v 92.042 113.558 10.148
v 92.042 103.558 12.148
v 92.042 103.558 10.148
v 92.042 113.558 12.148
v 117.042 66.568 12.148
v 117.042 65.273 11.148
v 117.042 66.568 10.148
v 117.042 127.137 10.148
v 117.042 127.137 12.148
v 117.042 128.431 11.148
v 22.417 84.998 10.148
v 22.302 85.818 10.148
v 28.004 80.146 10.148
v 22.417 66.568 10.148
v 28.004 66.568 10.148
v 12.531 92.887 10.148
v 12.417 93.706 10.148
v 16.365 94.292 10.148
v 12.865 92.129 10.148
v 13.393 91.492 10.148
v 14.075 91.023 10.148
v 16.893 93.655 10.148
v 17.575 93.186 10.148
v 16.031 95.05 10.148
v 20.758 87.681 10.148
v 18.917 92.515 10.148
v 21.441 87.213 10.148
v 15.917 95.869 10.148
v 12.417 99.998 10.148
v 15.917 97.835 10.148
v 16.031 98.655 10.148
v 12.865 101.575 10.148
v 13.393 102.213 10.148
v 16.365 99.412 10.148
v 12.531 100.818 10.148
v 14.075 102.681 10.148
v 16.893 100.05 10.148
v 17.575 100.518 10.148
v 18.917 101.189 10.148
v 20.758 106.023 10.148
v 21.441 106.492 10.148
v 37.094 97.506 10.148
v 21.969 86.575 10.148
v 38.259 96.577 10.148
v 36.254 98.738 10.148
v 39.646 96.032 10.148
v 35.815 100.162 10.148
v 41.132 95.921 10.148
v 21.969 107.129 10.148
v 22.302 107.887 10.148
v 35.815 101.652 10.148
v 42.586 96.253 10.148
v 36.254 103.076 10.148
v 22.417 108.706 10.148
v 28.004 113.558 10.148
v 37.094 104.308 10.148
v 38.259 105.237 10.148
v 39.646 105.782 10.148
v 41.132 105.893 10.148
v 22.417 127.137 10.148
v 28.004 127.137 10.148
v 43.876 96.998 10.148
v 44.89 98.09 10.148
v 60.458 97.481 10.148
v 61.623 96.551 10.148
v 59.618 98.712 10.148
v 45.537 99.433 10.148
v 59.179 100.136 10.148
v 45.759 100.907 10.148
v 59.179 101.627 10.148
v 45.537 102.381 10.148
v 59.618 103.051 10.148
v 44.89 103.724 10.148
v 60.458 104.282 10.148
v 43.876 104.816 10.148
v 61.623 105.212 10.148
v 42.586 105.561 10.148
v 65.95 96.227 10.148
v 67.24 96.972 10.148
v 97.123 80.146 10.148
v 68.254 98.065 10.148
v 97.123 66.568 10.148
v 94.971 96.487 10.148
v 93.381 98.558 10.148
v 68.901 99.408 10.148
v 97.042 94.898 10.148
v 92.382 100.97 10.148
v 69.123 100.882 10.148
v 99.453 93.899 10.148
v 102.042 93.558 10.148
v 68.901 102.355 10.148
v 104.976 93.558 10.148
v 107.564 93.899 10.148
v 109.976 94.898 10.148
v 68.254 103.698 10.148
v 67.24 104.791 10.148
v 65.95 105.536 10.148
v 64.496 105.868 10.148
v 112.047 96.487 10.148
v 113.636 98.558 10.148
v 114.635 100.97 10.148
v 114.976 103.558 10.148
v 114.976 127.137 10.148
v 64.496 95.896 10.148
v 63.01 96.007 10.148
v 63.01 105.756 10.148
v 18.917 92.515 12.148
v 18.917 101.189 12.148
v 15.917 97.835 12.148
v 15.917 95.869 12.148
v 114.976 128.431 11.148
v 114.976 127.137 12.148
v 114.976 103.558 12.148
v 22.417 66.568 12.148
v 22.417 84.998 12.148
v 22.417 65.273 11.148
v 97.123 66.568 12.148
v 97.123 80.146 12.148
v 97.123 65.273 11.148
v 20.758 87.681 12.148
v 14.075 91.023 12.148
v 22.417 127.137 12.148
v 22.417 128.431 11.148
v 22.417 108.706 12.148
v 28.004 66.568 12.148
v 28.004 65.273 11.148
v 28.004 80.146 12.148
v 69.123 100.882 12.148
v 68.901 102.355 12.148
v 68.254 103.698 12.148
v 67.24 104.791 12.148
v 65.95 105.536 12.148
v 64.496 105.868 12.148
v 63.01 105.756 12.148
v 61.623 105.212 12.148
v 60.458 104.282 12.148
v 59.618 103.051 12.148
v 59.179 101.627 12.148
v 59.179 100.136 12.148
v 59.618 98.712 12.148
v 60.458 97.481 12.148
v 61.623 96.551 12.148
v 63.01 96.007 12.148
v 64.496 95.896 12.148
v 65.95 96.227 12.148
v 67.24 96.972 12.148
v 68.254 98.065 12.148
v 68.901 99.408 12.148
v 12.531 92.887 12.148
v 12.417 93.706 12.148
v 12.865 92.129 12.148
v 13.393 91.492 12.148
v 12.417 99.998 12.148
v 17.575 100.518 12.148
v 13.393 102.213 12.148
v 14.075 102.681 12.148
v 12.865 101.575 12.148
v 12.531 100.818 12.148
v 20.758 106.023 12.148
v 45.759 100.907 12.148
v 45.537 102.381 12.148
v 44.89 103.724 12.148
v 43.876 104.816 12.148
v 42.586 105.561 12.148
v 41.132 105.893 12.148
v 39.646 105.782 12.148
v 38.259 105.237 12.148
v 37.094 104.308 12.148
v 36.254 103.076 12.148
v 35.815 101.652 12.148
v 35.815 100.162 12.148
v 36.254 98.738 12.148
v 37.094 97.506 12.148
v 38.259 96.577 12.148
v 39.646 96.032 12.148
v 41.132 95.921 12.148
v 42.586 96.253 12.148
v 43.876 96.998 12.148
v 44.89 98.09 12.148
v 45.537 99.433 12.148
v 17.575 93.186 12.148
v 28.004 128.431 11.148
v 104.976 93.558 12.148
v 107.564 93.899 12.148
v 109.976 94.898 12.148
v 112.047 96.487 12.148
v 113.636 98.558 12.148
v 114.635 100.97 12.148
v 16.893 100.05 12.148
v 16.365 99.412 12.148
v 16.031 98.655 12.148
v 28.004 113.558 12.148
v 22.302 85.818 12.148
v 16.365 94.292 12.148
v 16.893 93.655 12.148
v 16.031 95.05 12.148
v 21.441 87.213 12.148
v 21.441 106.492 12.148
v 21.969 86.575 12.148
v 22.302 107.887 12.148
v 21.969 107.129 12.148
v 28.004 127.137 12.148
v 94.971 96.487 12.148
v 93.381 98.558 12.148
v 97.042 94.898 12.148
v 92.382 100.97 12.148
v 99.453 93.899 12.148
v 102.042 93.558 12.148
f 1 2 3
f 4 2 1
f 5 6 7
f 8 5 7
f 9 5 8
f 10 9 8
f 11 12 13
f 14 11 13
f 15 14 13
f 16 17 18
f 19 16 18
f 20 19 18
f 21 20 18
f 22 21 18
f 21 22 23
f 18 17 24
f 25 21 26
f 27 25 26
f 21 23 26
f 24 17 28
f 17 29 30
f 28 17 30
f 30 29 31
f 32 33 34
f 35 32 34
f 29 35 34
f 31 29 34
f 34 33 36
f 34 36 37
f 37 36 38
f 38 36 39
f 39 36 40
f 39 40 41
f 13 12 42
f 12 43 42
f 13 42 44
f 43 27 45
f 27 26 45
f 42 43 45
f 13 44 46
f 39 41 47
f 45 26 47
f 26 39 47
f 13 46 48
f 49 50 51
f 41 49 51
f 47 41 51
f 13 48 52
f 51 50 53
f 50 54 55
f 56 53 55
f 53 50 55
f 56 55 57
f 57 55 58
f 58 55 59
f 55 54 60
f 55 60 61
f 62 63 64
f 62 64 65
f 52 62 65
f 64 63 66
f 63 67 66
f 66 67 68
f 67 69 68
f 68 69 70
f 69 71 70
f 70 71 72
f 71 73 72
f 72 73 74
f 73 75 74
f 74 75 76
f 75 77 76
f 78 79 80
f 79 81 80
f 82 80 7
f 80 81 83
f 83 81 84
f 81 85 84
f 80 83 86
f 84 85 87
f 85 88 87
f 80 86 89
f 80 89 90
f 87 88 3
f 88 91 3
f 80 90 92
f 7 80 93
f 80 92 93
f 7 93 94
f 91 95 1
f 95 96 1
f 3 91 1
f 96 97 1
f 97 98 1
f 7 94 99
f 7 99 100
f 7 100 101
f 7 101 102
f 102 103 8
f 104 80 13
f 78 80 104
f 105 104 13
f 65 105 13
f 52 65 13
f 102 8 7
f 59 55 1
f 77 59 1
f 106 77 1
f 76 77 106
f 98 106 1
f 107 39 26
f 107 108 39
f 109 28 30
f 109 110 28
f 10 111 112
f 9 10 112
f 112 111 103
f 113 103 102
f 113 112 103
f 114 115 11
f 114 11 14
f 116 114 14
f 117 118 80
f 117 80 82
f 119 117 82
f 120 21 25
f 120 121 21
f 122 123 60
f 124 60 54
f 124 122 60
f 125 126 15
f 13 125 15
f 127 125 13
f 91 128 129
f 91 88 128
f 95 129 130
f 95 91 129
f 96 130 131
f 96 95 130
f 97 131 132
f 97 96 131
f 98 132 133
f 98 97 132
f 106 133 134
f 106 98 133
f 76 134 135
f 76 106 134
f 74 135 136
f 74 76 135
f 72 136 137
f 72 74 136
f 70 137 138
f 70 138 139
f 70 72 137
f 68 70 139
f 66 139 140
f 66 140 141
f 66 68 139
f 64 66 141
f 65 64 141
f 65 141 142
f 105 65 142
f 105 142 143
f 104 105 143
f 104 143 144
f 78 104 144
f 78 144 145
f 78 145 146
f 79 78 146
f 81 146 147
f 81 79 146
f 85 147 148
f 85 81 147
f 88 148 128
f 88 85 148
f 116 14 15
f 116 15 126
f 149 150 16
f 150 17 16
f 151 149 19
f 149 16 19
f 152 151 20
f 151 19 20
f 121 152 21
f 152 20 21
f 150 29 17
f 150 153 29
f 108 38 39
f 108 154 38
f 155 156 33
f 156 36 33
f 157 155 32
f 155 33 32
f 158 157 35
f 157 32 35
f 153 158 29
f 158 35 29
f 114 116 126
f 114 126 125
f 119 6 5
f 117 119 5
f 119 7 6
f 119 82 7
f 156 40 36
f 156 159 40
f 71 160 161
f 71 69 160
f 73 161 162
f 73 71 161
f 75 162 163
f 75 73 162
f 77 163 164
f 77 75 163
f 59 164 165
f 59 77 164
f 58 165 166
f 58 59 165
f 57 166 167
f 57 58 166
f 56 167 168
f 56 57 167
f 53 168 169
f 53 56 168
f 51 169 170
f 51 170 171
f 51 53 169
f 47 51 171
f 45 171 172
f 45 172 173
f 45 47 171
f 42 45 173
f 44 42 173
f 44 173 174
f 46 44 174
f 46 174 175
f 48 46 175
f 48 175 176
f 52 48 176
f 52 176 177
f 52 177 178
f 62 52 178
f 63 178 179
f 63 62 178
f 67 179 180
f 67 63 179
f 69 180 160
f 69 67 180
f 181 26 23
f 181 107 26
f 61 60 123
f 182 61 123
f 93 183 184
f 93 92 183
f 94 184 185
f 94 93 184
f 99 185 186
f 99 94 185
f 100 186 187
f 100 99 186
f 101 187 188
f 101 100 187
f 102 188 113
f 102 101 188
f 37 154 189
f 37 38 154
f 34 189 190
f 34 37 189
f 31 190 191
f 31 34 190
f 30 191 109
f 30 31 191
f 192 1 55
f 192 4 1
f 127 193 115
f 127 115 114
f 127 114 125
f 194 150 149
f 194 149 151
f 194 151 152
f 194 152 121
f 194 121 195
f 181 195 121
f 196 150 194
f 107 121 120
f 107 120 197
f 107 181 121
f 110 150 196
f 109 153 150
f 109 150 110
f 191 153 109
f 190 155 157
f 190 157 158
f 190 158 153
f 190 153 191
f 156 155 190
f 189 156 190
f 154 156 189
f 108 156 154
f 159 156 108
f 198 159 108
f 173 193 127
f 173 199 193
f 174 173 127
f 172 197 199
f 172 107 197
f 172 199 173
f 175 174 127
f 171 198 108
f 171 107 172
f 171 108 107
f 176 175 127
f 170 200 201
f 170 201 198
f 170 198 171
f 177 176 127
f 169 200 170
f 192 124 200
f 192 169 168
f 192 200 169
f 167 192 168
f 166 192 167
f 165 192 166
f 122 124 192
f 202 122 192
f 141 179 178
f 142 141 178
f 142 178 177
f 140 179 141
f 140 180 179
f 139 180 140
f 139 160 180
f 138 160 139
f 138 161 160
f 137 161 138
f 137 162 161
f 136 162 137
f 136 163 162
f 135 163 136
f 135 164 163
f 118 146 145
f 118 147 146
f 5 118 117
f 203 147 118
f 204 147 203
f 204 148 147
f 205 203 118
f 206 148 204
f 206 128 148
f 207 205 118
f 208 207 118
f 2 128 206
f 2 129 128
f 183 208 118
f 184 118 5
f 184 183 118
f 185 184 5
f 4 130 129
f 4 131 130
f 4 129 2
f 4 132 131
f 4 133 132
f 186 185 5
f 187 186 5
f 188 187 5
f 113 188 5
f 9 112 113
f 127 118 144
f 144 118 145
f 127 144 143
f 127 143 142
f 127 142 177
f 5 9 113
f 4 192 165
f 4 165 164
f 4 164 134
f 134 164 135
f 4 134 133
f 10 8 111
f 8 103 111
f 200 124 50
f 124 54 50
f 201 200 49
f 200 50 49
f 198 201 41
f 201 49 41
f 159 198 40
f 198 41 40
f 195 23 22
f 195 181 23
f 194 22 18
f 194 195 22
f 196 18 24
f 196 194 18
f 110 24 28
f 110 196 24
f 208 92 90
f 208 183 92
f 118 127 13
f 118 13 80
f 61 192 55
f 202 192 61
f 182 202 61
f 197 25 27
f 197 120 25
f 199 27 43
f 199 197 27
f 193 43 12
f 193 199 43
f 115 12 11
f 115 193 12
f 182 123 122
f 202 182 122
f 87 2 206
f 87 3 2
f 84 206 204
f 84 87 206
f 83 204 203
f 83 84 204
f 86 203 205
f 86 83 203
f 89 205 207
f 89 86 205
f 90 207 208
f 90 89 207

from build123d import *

# Parameters (mm, degrees)
SKETCH1_R           = 5
BOSS_EXTRUDE1_DEPTH = 1
CUT_EXTRUDE1_DEPTH  = 161.089628267
FILLET1_R           = 10
FILLET2_R           = 3


with BuildPart() as part:
    # Sketch1 → Boss-Extrude1 (new, symmetric)
    with BuildSketch(Plane.XY.offset(11.1483132)):
        Polygon((12.416678302, 91.852215255), (22.416678302, 86.852215255), (22.416678302, 65.146170087), (28.004353293, 65.146170087), (28.004353293, 80.146170087), (97.122940581, 80.146170087), (97.122940581, 65.146170087), (117.041628722, 65.146170087), (117.041628722, 128.558260423), (114.975774521, 128.558260423), (114.975774521, 93.558260423), (92.041628722, 93.558260423), (92.041628722, 113.558260423), (28.004353293, 113.558260423), (28.004353293, 128.558260423), (22.416678302, 128.558260423), (22.416678302, 106.852215255), (12.416678302, 101.852215255), align=None)
        Polygon((18.916678302, 92.515334216), (15.916678302, 94.015334216), (15.916678302, 99.689096294), (18.916678302, 101.189096294), align=None, mode=Mode.SUBTRACT)
        with Locations((64.122810805, 100.881519454)):
            Circle(SKETCH1_R, mode=Mode.SUBTRACT)
        with Locations((40.75880907, 100.906977446)):
            Circle(SKETCH1_R, mode=Mode.SUBTRACT)
    extrude(amount=BOSS_EXTRUDE1_DEPTH, both=True)

    # Sketch2 → Cut-Extrude1 (cut, through all)
    with BuildSketch(Plane.ZY.offset(-22.416678302)):
        Polygon((10.106589297, 128.558260423), (10.106589297, 127.082553075), (11.1483132, 128.431101618), (12.190037103, 127.082553075), (12.190037103, 128.558260423), align=None)
        Polygon((12.190037103, 66.621877435), (12.190037103, 65.146170087), (10.106589297, 65.146170087), (10.106589297, 66.621877435), (11.1483132, 65.273328892), align=None)
    extrude(amount=-CUT_EXTRUDE1_DEPTH, mode=Mode.SUBTRACT)

    # Fillet1
    fillet1_edges = [part.edges().sort_by_distance(p)[0] for p in [
        (92.041628722, 93.558260423, 11.1483132),
        (114.975774521, 93.558260423, 11.1483132),
    ]]
    fillet(fillet1_edges, radius=FILLET1_R)

    # Fillet2
    fillet2_edges = [part.edges().sort_by_distance(p)[0] for p in [
        (15.916678302, 94.015334216, 11.1483132),
        (15.916678302, 99.689096294, 11.1483132),
        (22.416678302, 86.852215255, 11.1483132),
        (12.416678302, 91.852215255, 11.1483132),
        (12.416678302, 101.852215255, 11.1483132),
        (22.416678302, 106.852215255, 11.1483132),
    ]]
    fillet(fillet2_edges, radius=FILLET2_R)


solid = part.part
